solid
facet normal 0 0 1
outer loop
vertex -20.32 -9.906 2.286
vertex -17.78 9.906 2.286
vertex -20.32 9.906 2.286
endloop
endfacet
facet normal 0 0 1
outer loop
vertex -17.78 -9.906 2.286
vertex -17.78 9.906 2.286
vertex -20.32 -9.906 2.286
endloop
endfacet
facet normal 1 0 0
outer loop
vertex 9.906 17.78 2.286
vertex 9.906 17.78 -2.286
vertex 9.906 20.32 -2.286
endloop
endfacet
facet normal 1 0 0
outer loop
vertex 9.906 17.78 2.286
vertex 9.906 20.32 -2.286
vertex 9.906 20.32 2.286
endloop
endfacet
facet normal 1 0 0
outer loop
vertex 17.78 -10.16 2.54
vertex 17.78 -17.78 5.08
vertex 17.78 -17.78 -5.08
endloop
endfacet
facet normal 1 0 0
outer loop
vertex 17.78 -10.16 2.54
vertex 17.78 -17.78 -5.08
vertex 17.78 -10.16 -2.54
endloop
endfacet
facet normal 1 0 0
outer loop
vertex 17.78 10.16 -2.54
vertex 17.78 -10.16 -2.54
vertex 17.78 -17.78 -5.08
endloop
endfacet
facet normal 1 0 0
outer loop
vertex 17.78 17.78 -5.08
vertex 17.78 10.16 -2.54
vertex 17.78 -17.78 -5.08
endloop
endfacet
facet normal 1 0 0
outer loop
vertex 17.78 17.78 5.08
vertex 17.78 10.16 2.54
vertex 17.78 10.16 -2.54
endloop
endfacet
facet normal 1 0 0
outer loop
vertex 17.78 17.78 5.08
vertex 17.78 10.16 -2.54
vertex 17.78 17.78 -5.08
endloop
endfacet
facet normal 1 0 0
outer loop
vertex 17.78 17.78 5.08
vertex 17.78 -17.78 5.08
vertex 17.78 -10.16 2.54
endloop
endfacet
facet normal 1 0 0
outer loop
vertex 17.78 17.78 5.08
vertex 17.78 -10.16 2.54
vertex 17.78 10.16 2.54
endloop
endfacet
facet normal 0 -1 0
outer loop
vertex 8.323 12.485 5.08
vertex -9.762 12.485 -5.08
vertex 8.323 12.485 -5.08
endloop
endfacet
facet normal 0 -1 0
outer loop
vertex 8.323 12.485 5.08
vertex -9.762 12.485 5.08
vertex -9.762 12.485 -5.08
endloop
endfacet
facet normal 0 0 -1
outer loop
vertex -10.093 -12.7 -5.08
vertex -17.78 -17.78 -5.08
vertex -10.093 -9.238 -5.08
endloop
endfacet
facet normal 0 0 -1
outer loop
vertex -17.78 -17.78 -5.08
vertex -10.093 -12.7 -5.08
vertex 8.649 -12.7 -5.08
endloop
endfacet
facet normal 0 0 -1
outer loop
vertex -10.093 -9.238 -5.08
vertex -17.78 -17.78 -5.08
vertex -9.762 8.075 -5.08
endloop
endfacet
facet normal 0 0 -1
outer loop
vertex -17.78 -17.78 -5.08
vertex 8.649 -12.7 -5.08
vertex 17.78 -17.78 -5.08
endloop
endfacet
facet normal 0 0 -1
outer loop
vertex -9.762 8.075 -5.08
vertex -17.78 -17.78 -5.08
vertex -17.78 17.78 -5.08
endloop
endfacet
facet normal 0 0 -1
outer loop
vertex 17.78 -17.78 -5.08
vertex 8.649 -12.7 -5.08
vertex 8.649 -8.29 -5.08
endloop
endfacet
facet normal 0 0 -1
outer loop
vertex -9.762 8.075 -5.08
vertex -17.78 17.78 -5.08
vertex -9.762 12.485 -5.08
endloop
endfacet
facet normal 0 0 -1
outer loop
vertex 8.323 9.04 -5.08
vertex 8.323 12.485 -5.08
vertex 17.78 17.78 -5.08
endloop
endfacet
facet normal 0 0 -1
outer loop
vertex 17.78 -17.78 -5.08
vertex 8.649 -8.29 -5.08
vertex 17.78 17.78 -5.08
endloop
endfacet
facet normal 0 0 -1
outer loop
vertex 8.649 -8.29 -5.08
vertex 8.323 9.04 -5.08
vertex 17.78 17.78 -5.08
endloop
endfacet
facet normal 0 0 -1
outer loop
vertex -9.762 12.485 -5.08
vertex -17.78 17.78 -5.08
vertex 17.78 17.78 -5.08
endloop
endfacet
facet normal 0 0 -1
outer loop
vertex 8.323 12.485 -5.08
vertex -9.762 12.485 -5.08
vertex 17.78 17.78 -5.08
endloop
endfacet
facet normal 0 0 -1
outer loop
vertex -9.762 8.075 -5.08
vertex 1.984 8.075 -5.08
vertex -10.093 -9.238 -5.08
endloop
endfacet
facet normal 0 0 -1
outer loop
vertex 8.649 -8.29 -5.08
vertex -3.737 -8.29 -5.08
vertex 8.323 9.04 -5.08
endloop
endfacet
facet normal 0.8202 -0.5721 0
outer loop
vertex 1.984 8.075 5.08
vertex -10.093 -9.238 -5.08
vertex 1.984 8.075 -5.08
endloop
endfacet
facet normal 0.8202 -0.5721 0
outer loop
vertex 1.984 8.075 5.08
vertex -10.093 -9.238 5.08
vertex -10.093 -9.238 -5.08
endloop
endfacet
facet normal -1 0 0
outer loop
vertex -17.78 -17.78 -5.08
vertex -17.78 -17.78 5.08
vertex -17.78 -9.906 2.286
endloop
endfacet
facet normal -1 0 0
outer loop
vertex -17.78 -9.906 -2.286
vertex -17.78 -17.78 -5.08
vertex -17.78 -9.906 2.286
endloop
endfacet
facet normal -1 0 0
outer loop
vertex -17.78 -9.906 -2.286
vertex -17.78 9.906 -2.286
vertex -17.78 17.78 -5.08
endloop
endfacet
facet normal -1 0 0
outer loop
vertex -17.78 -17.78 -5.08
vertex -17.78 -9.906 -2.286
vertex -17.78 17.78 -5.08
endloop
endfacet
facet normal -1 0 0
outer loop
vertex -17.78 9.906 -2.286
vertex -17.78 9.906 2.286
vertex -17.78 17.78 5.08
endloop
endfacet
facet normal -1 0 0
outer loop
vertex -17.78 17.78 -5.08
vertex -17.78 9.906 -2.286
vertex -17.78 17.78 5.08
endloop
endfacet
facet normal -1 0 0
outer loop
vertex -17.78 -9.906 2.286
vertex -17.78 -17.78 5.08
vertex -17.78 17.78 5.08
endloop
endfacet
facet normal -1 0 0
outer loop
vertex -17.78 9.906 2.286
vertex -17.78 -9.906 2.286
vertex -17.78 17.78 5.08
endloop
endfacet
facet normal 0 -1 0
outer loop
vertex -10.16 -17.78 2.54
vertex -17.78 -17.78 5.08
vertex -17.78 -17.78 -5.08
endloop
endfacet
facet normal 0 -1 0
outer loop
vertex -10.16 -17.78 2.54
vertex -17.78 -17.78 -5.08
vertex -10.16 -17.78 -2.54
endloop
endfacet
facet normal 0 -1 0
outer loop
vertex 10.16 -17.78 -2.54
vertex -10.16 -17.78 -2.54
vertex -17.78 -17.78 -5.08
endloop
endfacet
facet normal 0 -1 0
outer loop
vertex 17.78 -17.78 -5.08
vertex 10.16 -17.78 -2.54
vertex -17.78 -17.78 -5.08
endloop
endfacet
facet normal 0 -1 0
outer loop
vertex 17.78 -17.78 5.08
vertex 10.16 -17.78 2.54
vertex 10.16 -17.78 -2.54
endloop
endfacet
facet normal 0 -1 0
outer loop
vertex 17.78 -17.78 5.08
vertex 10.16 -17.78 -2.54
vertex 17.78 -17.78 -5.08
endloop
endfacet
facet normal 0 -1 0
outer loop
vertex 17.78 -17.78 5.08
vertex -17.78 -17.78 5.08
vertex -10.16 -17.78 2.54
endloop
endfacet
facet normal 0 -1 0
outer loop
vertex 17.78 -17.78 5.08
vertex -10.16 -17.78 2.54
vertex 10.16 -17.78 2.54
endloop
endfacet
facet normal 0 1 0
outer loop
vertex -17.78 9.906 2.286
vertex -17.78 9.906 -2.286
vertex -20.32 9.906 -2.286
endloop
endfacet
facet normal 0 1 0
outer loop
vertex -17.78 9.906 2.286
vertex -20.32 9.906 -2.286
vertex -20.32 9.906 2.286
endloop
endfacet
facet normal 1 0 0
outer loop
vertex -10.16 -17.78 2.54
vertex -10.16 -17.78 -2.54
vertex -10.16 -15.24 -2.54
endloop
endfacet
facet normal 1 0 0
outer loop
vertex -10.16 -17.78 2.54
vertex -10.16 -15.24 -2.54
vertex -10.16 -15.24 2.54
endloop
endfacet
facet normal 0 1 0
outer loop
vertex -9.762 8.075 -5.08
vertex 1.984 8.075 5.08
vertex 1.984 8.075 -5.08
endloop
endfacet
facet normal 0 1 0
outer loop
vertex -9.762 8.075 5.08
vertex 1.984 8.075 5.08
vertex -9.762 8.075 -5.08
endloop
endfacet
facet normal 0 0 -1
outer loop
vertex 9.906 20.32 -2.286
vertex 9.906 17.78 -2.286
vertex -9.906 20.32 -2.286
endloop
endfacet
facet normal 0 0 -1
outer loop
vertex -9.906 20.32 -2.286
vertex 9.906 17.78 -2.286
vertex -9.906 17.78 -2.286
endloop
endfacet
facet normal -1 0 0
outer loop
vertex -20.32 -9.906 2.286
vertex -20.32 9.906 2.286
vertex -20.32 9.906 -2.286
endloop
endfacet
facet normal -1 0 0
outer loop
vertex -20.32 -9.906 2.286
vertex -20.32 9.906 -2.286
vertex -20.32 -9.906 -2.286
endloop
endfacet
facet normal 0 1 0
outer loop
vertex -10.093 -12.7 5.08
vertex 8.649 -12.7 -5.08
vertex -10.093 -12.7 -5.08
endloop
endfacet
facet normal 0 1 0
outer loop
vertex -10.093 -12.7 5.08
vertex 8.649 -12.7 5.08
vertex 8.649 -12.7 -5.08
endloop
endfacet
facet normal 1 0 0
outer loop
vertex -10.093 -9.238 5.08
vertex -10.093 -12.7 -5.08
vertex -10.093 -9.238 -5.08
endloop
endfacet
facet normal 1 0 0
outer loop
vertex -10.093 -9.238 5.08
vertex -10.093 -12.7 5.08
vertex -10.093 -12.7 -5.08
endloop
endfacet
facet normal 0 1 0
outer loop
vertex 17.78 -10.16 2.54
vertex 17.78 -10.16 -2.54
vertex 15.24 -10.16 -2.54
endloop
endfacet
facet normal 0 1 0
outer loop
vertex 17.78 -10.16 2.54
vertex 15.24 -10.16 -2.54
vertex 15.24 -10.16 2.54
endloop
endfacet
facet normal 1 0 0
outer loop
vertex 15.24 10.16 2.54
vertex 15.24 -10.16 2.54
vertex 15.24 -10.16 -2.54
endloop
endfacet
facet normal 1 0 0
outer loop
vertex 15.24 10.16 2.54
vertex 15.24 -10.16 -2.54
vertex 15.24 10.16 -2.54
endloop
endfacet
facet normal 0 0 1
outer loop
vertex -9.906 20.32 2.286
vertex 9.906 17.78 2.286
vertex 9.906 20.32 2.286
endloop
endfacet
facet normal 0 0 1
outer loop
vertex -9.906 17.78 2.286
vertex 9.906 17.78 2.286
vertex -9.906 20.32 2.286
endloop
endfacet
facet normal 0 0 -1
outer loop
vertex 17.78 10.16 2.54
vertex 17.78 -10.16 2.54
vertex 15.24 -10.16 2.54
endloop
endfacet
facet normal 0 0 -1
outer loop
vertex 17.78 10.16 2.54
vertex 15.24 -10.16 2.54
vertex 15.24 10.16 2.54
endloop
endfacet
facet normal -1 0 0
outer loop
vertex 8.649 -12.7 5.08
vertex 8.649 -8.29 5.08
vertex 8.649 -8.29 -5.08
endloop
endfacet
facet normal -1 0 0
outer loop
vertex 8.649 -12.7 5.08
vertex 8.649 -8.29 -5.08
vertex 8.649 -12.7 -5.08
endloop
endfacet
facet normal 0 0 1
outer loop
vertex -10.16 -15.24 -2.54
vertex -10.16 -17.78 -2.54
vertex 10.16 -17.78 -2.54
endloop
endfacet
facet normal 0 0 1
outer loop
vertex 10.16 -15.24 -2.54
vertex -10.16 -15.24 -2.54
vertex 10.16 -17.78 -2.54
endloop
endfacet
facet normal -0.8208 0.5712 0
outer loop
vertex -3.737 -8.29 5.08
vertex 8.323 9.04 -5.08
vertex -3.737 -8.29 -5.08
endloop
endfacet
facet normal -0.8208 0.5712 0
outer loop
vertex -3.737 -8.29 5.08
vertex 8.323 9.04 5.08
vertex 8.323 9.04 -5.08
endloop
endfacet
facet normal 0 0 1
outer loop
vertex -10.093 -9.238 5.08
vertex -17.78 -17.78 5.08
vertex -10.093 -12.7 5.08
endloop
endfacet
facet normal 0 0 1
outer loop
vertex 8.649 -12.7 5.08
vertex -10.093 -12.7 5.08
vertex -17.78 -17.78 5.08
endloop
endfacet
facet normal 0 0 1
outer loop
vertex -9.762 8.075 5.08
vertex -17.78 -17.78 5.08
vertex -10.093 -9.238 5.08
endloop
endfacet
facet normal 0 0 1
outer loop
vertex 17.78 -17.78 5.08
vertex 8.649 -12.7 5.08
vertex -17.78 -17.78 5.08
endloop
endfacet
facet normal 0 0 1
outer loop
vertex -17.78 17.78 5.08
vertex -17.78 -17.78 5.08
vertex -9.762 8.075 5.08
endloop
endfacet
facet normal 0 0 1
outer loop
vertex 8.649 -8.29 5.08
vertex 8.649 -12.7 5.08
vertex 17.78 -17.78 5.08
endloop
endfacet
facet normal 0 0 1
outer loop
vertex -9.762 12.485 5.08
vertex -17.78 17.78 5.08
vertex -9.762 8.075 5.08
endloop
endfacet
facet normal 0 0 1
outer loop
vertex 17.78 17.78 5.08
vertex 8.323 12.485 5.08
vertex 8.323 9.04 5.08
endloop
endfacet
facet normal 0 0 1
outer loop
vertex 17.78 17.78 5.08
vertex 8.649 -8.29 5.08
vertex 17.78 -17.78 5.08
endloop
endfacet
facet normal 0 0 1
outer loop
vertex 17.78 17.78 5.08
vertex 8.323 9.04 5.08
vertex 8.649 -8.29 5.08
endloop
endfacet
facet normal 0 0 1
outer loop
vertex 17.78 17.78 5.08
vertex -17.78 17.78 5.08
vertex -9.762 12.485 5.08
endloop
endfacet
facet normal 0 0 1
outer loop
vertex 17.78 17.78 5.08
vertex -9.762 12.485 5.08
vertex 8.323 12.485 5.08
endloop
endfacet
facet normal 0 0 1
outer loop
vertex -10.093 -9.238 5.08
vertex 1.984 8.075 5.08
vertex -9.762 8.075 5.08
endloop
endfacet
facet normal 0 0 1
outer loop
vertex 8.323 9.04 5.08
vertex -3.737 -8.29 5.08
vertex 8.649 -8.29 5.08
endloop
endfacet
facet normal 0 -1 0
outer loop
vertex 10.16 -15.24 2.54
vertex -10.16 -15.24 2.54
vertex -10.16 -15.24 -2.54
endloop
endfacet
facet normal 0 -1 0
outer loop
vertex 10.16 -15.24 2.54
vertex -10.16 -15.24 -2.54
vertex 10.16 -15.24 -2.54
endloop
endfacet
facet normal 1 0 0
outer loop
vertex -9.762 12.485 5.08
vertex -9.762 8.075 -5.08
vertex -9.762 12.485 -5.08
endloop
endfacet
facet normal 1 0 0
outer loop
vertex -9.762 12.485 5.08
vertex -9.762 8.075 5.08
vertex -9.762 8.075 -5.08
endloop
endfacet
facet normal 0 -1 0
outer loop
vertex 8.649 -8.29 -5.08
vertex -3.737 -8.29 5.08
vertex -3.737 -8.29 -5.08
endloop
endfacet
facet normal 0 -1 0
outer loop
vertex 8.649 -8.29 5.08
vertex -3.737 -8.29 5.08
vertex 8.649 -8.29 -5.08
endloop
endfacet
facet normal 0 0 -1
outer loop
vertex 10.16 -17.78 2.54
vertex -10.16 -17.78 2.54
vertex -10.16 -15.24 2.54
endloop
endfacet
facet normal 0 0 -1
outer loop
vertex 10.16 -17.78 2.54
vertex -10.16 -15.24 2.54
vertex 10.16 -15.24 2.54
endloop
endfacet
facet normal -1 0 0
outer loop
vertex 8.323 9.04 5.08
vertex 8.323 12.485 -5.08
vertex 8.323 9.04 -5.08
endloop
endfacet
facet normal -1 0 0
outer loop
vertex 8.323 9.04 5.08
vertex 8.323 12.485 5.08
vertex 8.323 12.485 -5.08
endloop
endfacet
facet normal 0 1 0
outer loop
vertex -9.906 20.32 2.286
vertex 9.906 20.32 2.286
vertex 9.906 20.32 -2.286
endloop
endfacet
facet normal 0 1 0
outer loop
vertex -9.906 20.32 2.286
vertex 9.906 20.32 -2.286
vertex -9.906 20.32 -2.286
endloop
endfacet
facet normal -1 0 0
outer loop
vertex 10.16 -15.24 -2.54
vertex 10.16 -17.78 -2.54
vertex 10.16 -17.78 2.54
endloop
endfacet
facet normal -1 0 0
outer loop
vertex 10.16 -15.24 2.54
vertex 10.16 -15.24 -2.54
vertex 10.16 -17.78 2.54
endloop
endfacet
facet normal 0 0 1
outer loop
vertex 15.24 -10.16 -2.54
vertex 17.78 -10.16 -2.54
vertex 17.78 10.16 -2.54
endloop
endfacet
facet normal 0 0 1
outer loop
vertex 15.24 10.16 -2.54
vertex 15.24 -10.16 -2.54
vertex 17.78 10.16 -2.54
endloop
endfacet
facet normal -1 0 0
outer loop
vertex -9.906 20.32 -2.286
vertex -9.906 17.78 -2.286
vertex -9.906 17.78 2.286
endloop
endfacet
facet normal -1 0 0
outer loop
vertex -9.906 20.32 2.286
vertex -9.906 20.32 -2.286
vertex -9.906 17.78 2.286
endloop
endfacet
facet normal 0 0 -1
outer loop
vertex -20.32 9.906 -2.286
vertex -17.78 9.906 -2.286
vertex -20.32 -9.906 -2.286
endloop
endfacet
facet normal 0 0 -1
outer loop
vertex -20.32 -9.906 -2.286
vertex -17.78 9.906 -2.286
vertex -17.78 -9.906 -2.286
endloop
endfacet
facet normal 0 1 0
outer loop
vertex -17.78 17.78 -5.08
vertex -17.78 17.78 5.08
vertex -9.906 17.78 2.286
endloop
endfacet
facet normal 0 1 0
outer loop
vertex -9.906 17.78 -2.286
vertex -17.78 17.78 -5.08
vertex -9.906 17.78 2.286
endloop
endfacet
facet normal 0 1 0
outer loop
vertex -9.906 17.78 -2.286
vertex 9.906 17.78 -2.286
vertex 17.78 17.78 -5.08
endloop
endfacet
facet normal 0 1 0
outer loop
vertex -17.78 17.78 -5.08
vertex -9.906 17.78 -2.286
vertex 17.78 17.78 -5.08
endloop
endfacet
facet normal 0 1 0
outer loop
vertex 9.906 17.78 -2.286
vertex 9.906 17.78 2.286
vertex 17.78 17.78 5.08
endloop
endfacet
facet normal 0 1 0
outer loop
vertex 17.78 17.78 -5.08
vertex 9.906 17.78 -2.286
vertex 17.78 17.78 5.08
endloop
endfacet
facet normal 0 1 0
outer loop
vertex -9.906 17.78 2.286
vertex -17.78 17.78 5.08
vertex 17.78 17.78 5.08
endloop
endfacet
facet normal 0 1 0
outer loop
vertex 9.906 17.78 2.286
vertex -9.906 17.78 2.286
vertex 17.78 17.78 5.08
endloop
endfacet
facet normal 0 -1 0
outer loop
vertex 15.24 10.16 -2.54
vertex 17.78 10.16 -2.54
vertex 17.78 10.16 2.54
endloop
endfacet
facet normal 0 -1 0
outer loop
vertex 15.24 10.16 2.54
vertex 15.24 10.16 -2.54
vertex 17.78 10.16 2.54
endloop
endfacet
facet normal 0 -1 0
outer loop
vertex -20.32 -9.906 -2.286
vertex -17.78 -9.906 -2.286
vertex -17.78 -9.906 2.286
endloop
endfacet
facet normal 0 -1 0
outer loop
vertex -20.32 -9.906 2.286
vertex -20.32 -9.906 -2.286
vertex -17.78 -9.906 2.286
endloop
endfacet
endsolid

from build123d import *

# Parameters (mm, degrees)
F0_W     = 35.56
F0_H     = 35.56
F1_DEPTH = 5.08
F2_W     = 19.812
F2_H     = 4.572
F3_DEPTH = 2.54
F4_W     = 19.812
F4_H     = 4.572
F5_DEPTH = 2.54
F6_W     = 20.32
F6_H     = 5.08
F7_DEPTH = 2.54
F8_W     = 20.32
F8_H     = 5.08
F9_DEPTH = 2.54


with BuildPart() as f1:
    # F0 (on Top) → F1 (new body, symmetric)
    with BuildSketch(Plane.XY):
        Rectangle(F0_W, F0_H)
        Polygon((8.6485677083, -8.2902777778), (8.6485677083, -12.7), (-10.0927517361, -12.7), (-10.0927517361, -9.2383680556), (1.984375, 8.0753038194), (-9.7620225694, 8.0753038194), (-9.7620225694, 12.4850260417), (8.3233506944, 12.4850260417), (8.3233506944, 9.0399305556), (-3.7372395833, -8.2902777778), align=None, mode=Mode.SUBTRACT)
    extrude(amount=F1_DEPTH, both=True)

    # F2 (on face) → F3 (join)
    with BuildSketch(Plane(origin=(0, 17.78, 0), x_dir=(-1, 0, 0), z_dir=(0, 1, 0))):
        Rectangle(F2_W, F2_H)
    extrude(amount=F3_DEPTH)

    # F4 (on face) → F5 (join)
    with BuildSketch(Plane(origin=(-17.78, 0, 0), x_dir=(0, -1, 0), z_dir=(-1, 0, 0))):
        Rectangle(F4_W, F4_H)
    extrude(amount=F5_DEPTH)

    # F6 (on face) → F7 (cut)
    with BuildSketch(Plane.XZ.offset(17.78)):
        Rectangle(F6_W, F6_H)
    extrude(amount=-F7_DEPTH, mode=Mode.SUBTRACT)

    # F8 (on face) → F9 (cut)
    with BuildSketch(Plane.YZ.offset(17.78)):
        Rectangle(F8_W, F8_H)
    extrude(amount=-F9_DEPTH, mode=Mode.SUBTRACT)


solid = f1.part
